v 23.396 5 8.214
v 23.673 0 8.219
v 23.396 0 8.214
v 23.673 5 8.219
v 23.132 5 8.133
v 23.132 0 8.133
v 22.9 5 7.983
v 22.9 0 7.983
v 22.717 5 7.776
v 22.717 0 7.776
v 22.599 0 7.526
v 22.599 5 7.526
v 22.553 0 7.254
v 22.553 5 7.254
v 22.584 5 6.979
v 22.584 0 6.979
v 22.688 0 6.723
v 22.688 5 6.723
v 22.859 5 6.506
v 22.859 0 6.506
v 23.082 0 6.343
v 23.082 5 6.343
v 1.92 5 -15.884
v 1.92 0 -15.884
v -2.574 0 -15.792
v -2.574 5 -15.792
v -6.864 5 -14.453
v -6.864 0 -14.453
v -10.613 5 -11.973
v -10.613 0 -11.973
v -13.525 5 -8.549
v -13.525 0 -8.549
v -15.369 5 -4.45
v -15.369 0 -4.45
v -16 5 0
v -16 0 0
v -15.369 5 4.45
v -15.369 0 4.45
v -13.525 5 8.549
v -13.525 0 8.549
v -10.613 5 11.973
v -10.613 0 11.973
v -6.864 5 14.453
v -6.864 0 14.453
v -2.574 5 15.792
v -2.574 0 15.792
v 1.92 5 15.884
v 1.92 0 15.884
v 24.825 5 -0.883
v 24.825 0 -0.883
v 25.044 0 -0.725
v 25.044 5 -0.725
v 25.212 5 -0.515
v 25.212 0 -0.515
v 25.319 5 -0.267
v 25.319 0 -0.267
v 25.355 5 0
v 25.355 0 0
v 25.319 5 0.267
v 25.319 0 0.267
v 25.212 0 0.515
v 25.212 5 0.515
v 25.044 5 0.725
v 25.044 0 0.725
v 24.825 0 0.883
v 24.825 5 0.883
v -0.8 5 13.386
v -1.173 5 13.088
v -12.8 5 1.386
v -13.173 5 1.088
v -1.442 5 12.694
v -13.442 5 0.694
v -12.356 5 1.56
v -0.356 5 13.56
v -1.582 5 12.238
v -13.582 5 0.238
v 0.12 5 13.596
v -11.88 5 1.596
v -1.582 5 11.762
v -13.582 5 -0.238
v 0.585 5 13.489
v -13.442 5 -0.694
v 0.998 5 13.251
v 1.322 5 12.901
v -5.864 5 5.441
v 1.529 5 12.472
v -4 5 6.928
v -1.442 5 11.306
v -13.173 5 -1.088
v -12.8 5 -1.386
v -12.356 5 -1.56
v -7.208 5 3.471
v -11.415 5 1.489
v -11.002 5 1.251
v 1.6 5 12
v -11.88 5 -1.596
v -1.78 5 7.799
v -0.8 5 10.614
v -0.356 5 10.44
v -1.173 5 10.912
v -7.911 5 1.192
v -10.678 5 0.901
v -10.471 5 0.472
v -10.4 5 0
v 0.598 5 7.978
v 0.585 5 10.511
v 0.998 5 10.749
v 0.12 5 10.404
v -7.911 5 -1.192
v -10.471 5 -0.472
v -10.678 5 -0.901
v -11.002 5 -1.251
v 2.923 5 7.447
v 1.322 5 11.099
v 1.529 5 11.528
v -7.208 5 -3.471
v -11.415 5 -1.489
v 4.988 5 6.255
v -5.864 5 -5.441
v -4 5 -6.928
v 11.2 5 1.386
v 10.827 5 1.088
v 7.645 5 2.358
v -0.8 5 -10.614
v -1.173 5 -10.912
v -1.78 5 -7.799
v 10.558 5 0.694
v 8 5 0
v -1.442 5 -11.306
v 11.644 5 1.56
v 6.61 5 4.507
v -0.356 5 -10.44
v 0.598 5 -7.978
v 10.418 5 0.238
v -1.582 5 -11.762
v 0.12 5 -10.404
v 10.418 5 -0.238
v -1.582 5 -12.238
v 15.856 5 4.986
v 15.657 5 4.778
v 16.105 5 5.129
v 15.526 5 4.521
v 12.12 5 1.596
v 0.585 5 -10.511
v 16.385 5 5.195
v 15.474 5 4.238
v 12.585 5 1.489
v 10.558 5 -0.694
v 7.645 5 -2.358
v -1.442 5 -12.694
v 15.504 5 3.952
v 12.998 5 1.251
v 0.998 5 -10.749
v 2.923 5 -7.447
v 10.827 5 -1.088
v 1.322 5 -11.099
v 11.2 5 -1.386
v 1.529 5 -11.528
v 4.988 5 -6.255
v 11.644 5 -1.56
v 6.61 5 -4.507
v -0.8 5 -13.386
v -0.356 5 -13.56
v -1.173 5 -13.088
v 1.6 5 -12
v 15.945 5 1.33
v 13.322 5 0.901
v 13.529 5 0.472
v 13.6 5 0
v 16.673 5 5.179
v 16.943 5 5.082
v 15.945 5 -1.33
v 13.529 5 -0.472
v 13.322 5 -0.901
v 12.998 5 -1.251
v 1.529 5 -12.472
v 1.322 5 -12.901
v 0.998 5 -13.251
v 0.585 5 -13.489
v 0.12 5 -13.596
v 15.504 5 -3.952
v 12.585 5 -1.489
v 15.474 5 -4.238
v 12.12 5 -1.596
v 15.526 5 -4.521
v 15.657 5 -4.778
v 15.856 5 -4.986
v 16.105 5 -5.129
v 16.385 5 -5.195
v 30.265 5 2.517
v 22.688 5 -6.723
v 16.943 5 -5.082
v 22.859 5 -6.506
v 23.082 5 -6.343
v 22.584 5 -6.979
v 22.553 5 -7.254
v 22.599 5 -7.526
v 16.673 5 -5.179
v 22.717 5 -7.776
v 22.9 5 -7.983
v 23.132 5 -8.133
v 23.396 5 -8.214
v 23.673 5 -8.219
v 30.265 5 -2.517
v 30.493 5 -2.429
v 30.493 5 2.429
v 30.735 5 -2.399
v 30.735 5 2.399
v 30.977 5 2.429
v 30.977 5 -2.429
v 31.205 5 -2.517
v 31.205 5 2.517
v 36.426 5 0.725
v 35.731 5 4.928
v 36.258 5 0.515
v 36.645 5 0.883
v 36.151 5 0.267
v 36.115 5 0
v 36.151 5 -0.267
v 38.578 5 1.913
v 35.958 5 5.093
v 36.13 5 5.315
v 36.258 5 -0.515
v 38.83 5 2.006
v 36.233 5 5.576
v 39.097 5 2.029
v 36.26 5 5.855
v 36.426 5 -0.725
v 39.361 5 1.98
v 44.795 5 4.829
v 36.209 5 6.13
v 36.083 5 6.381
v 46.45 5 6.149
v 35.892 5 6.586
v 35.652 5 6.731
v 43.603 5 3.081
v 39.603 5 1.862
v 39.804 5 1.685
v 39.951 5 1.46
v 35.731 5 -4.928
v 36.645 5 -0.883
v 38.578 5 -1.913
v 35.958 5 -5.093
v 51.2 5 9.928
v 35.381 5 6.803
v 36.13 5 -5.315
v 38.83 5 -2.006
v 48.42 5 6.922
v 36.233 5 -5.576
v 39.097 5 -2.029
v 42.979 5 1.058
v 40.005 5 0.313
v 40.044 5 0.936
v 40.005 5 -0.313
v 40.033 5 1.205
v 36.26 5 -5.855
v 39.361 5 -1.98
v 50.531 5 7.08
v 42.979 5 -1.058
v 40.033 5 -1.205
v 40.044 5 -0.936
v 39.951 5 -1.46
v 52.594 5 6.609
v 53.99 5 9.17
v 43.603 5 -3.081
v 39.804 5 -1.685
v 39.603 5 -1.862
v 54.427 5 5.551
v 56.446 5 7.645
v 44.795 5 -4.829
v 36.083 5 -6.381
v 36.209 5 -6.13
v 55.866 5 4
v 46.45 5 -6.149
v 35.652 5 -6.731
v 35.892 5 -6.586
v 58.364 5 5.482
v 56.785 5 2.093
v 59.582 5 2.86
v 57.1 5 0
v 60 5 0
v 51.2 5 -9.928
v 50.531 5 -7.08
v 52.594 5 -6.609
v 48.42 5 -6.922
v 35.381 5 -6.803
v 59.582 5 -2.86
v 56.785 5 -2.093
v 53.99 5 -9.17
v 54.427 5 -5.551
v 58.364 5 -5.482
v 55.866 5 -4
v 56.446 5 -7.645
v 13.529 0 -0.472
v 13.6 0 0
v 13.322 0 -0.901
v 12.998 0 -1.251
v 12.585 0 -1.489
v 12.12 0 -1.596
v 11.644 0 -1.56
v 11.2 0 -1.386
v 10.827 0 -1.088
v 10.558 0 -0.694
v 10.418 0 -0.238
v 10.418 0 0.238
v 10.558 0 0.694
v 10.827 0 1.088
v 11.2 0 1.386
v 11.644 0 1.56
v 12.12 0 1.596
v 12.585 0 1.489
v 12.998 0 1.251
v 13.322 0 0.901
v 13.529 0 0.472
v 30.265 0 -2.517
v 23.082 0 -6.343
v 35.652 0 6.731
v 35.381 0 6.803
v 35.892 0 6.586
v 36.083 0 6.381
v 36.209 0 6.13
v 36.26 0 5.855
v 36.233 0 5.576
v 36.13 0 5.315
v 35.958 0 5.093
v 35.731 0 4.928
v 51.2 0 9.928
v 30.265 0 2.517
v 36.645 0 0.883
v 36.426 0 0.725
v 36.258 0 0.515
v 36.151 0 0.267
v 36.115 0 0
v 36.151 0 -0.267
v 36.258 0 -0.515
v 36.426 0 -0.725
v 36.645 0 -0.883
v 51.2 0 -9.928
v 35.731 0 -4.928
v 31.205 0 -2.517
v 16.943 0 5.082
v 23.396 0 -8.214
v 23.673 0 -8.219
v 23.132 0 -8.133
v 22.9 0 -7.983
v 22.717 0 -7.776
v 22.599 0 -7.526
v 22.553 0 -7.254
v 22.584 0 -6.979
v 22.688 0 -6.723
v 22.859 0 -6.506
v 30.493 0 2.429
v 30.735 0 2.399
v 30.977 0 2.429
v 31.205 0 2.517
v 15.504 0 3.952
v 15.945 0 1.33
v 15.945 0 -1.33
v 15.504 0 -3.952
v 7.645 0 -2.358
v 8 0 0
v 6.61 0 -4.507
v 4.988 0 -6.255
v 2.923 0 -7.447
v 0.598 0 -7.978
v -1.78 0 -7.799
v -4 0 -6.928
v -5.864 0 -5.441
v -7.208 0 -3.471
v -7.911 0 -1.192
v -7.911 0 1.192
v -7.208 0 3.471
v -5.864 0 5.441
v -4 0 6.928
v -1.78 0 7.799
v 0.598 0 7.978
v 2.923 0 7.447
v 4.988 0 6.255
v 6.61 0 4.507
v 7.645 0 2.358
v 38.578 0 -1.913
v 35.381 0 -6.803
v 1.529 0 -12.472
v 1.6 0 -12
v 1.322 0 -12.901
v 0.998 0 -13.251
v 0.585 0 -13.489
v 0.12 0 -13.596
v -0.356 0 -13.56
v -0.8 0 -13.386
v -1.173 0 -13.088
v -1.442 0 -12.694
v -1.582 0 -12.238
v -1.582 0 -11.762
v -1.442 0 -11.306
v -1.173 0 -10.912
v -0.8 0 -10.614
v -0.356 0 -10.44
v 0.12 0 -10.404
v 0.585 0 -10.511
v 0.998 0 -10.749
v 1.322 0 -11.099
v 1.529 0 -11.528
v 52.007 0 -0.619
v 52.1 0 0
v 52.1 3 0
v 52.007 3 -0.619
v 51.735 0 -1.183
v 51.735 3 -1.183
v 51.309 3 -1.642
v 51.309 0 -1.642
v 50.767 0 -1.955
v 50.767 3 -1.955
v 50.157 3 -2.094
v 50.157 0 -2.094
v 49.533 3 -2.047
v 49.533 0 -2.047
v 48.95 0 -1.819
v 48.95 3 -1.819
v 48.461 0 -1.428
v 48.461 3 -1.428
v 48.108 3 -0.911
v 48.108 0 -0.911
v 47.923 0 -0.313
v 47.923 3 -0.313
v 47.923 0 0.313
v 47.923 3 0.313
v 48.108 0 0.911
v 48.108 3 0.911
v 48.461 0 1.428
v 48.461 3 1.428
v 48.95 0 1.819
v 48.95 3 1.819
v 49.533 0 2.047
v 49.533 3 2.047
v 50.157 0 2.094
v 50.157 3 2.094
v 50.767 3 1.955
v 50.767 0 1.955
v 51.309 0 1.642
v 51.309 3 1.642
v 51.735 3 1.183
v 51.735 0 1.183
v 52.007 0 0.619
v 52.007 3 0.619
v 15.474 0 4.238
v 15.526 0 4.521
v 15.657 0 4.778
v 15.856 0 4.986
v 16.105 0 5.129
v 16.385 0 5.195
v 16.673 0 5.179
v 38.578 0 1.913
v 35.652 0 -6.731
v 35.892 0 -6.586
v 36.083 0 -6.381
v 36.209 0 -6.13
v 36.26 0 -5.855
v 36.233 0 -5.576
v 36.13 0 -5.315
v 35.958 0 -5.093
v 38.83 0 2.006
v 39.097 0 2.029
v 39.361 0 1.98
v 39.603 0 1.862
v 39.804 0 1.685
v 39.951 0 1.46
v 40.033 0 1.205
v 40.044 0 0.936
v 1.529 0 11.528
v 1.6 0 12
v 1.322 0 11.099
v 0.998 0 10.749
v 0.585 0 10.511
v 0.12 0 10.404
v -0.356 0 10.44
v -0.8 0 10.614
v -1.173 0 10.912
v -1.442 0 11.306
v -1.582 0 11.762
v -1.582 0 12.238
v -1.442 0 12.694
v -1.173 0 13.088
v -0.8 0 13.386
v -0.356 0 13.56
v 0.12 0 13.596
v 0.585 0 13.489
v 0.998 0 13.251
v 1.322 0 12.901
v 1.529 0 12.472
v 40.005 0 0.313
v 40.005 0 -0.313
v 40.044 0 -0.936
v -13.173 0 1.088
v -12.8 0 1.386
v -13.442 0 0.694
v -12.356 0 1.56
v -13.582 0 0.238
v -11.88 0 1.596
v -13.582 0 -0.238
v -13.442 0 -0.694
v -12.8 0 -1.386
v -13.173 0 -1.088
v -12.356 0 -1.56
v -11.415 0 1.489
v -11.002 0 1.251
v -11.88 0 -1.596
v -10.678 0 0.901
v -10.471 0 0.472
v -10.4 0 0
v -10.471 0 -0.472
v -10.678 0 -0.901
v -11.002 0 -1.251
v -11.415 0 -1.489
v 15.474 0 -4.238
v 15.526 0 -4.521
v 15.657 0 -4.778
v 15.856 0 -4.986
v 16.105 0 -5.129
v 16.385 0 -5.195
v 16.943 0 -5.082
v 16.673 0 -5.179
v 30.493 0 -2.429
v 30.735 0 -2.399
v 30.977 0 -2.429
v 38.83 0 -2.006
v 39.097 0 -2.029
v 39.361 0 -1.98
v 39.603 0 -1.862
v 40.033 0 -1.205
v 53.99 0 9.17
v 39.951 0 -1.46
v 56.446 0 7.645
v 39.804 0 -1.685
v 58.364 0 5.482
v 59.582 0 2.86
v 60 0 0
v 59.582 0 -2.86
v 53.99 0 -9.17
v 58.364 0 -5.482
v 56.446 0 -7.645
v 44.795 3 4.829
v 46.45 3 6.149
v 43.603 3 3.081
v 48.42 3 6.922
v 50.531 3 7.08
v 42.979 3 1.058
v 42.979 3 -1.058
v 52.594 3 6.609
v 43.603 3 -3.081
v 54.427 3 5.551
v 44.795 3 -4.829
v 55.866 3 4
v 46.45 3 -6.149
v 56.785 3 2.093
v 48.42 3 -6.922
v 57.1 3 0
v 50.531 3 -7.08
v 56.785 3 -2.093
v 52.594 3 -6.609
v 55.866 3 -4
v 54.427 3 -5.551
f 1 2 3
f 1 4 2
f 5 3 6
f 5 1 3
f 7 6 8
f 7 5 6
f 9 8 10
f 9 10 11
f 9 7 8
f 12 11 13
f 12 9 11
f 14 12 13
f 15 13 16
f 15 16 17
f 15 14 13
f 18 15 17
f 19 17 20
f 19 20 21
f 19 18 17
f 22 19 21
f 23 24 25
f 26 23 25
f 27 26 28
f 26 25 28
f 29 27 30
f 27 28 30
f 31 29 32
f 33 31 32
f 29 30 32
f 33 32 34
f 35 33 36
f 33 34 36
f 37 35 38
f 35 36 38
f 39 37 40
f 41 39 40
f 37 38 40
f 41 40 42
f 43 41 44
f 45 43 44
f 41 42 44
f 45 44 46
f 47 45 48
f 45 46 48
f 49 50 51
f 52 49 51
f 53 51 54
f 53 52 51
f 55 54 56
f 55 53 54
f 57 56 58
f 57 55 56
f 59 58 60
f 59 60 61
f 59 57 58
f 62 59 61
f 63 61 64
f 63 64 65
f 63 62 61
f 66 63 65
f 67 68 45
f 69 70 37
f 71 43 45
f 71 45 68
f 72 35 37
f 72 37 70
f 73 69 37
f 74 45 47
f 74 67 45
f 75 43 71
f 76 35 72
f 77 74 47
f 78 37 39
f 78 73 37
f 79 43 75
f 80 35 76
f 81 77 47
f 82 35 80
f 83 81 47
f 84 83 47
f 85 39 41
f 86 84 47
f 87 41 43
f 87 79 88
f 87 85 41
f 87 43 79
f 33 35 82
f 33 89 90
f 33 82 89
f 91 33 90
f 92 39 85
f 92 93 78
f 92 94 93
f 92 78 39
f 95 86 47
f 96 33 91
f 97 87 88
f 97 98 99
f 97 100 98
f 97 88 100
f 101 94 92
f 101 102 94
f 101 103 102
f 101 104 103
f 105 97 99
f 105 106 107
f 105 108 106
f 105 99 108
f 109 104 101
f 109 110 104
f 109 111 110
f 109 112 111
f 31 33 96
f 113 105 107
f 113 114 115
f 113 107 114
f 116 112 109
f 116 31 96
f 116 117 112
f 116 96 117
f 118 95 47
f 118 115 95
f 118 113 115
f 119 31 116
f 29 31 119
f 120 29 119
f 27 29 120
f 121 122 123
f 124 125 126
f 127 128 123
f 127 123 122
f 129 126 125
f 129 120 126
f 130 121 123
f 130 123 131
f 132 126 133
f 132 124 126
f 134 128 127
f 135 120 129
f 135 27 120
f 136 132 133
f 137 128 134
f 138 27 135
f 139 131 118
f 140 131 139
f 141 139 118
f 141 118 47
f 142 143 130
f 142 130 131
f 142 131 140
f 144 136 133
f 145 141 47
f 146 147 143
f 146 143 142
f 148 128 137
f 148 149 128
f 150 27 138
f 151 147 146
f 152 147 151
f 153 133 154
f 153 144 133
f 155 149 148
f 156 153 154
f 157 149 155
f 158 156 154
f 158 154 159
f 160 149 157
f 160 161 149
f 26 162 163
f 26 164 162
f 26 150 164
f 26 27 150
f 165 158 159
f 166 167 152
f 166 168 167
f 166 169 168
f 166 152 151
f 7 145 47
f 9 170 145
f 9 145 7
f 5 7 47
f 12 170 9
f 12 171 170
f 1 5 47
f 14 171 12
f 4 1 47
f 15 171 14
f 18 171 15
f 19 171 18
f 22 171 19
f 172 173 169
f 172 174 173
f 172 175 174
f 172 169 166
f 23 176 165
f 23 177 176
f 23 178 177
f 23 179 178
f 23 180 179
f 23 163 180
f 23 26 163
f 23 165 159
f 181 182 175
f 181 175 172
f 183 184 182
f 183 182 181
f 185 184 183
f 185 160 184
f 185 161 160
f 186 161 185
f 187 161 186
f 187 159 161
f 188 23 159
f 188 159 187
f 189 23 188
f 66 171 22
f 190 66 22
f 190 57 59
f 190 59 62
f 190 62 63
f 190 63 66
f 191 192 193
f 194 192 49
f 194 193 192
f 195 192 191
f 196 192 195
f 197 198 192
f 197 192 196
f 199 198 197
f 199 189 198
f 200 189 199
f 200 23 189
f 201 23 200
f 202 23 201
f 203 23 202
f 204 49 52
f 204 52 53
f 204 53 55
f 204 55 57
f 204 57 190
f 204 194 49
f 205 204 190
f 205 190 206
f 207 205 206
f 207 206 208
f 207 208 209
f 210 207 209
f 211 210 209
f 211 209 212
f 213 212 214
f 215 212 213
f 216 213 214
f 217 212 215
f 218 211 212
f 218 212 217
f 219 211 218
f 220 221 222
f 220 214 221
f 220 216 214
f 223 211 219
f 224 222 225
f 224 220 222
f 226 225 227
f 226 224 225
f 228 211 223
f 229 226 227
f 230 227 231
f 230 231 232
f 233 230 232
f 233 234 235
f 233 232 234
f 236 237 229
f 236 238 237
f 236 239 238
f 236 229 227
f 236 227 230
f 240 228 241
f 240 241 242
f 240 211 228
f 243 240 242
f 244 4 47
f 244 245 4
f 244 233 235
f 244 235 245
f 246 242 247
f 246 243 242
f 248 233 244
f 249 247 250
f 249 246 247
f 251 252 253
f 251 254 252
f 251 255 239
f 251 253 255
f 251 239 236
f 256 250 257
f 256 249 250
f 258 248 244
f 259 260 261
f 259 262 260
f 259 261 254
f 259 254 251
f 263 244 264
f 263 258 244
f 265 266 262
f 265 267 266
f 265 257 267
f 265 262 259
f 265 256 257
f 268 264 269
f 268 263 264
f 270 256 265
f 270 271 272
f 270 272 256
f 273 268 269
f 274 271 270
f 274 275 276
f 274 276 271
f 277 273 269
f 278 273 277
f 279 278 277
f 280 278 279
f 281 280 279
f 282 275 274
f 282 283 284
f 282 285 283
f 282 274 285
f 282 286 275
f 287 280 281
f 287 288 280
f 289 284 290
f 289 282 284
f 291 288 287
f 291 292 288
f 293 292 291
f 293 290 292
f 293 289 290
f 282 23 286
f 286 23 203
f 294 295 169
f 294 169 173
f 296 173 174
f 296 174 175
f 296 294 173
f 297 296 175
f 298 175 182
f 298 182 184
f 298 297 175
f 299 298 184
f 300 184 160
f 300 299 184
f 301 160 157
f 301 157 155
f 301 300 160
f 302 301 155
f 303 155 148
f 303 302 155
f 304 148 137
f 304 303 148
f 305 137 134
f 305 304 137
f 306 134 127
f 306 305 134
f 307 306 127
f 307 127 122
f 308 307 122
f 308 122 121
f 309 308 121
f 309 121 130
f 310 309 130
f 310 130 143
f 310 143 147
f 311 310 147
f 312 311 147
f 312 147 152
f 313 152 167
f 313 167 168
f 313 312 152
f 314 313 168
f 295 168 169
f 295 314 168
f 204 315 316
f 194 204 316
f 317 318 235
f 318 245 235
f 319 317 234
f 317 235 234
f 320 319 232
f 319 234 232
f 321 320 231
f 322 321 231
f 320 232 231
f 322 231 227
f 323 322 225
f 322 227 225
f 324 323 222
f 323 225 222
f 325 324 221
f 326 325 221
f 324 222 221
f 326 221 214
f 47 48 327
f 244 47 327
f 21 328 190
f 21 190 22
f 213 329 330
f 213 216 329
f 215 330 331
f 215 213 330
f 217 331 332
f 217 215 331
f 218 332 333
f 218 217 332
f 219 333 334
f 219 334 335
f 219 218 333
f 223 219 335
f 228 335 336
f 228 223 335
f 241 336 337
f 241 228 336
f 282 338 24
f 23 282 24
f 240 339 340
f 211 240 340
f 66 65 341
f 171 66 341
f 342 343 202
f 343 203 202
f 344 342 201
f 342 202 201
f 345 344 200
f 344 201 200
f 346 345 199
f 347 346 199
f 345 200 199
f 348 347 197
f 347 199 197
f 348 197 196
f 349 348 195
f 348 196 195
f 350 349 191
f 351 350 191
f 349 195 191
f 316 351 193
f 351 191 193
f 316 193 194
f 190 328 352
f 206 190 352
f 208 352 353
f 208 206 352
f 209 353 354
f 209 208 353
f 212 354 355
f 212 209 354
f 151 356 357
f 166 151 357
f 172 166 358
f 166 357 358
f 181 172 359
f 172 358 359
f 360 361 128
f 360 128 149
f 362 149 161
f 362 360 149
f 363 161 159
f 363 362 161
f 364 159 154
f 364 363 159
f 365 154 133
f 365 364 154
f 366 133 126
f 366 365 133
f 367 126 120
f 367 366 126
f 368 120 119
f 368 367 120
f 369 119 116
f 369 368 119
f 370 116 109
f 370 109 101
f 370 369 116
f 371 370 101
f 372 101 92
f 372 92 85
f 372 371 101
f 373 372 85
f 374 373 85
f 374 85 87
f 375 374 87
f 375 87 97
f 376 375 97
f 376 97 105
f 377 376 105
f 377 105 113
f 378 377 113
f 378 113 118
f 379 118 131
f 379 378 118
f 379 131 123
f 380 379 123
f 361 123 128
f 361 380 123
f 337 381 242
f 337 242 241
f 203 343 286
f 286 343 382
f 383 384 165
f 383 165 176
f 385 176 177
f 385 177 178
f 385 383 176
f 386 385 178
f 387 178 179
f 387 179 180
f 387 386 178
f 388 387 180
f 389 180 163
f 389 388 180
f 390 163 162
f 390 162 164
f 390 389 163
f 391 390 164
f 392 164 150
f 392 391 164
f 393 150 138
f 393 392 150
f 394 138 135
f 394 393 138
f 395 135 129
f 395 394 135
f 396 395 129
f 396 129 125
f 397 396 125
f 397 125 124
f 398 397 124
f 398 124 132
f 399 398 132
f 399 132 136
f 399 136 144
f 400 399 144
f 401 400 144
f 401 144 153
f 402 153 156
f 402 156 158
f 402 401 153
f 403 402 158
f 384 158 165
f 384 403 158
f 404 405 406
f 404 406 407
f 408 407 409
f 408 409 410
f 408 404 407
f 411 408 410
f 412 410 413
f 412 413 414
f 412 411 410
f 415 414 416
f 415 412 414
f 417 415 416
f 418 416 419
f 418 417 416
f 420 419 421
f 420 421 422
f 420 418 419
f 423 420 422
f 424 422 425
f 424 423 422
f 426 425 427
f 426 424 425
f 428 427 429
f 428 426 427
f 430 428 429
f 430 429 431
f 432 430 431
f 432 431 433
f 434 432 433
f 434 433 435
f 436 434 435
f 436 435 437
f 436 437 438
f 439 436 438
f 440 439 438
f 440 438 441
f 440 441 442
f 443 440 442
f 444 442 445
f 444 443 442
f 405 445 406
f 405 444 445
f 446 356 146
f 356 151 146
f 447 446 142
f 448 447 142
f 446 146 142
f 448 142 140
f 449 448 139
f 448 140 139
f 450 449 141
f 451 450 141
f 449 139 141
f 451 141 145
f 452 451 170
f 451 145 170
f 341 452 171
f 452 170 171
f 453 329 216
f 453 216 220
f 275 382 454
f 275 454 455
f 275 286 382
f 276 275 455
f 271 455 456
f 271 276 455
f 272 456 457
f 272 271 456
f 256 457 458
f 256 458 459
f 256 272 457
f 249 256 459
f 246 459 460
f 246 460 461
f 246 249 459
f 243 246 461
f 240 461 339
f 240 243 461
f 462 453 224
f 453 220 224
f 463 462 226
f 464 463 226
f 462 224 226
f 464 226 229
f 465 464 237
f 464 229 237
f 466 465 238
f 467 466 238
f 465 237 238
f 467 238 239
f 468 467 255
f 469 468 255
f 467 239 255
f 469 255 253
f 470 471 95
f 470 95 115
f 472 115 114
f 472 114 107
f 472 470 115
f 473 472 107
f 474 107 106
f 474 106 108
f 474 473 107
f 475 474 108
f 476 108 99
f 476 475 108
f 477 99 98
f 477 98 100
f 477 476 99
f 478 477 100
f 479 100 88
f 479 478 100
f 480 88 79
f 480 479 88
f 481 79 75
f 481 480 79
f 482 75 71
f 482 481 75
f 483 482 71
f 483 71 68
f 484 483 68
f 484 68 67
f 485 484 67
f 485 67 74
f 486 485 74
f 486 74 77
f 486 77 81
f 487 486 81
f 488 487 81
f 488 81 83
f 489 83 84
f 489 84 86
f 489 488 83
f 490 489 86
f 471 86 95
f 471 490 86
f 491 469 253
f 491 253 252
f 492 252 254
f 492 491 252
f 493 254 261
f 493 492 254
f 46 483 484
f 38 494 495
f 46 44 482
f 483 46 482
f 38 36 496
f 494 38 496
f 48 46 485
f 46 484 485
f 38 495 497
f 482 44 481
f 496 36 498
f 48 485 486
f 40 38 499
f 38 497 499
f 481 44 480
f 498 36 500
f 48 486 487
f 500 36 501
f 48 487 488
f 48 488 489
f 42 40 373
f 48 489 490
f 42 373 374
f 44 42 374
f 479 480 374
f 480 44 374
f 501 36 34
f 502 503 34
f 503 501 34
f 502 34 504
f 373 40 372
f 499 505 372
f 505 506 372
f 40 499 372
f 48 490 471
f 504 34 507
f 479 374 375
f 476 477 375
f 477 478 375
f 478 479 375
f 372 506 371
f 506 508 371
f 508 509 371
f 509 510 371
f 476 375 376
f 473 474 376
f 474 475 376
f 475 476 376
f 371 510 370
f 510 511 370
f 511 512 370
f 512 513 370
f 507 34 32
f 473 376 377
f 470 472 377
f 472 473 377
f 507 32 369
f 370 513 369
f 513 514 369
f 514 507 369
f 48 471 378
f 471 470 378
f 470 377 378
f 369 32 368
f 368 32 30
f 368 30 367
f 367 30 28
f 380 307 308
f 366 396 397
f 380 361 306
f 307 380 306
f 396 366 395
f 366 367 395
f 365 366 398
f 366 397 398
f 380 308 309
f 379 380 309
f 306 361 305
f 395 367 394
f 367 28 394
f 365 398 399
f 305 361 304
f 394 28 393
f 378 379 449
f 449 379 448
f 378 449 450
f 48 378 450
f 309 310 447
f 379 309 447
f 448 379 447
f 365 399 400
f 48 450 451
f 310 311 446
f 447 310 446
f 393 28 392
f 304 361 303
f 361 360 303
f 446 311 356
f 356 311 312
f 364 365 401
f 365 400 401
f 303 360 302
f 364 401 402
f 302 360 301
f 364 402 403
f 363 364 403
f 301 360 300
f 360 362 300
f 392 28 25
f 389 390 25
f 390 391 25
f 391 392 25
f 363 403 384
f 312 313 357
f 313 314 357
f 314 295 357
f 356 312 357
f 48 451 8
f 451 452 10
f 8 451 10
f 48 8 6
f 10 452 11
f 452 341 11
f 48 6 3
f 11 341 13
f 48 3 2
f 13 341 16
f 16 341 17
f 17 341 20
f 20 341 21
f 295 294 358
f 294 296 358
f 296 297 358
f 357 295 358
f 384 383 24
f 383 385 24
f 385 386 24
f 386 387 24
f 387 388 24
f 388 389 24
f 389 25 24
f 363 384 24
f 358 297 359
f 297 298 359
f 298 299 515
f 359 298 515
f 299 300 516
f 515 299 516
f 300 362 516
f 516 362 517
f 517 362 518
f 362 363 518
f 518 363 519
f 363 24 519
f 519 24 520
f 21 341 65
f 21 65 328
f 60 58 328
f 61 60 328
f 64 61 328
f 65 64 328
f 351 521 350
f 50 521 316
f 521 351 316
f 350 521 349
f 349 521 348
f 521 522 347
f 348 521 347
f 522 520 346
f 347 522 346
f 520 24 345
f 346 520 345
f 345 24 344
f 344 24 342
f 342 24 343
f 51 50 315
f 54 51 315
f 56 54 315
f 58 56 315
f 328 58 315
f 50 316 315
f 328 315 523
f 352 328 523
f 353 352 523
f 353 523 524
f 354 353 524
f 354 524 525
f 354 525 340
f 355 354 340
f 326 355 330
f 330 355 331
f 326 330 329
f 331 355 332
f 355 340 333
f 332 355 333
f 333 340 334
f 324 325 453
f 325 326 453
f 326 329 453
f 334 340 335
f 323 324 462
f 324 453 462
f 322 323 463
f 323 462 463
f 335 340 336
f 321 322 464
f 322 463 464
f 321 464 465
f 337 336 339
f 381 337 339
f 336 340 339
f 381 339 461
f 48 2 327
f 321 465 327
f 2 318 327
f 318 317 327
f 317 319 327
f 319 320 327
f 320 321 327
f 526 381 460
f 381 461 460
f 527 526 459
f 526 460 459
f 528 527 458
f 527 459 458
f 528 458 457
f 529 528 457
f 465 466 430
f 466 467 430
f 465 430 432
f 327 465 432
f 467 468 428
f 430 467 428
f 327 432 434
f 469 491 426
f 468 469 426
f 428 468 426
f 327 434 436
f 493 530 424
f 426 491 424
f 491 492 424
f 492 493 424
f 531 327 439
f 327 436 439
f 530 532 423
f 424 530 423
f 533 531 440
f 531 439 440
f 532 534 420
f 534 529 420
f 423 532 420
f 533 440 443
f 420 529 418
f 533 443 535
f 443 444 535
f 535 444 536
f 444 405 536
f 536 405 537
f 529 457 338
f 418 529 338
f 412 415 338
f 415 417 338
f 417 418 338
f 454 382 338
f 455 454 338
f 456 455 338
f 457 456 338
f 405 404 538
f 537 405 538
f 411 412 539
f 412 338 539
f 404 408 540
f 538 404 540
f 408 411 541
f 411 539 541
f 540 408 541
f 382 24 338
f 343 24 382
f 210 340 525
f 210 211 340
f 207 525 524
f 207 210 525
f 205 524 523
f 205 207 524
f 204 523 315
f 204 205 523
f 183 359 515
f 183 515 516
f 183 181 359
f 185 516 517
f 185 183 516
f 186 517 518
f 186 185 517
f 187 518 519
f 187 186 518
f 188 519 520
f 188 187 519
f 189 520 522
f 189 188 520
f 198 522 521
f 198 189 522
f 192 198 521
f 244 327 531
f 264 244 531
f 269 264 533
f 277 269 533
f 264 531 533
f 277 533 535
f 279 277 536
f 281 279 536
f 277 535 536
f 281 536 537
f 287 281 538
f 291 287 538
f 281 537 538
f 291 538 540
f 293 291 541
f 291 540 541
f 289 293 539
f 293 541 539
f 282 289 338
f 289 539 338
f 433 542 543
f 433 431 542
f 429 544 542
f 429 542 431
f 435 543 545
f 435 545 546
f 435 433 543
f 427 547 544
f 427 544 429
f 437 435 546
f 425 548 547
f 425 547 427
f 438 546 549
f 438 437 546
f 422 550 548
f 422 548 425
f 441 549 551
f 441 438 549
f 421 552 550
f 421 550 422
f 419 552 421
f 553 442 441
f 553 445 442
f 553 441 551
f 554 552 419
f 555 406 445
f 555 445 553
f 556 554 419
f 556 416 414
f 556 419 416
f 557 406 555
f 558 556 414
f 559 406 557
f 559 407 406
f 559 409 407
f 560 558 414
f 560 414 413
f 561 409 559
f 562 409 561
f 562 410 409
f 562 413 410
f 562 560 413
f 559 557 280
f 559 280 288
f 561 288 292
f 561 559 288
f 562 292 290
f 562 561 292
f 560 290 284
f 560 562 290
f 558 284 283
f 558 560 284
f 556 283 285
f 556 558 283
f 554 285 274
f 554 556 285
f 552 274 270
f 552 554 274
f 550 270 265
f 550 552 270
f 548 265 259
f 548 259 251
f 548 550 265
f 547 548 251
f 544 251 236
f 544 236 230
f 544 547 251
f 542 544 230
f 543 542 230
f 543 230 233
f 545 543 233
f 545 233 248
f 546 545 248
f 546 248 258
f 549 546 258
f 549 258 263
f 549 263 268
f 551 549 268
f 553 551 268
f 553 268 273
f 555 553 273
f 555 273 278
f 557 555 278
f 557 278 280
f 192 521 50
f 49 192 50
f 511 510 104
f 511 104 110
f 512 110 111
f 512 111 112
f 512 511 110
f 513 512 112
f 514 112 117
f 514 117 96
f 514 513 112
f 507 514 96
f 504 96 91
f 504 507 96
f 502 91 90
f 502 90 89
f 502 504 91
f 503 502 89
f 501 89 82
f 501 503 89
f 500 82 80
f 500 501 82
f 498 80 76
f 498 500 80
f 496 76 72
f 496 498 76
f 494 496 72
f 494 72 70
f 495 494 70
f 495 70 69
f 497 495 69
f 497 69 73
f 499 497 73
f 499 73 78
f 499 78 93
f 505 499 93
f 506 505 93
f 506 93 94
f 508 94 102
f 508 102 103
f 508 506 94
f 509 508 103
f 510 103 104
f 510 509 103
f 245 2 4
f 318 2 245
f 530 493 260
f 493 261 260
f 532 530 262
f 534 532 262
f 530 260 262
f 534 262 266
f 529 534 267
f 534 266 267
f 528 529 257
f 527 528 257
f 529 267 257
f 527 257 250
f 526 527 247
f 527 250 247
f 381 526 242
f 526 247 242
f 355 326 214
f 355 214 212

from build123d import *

# Parameters (mm, degrees)
SKETCH_1_R      = 1.6
SKETCH_1_R_2    = 8
SKETCH_1_R_3    = 7.1
EXTRUDE_1_DEPTH = 5
SKETCH_1_3_R    = 7.1
SKETCH_1_3_R_2  = 2.1
EXTRUDE_2_DEPTH = 3
FILLET_1_R      = 1
FILLET_2_R      = 1
FILLET_3_R      = 1
FILLET_4_R      = 1


with BuildPart() as part:
    # 草图1 → 凸台-拉伸1 (new body)
    with BuildSketch(Plane(origin=(0, 0, 0), x_dir=(1, 0, 0), z_dir=(0, 1, 0))):
        with BuildLine():
            ThreePointArc((1.92, 15.884382267), (-16, 0), (1.92, -15.884382267))
            Line((1.92, -15.884382267), (51.2, -9.927738917))
            ThreePointArc((51.2, -9.927738917), (60, 0), (51.2, 9.927738917))
            Line((51.2, 9.927738917), (1.92, 15.884382267))
        make_face()
        with Locations((0, -12)):
            Circle(SKETCH_1_R, mode=Mode.SUBTRACT)
        with Locations((-12, 0)):
            Circle(SKETCH_1_R, mode=Mode.SUBTRACT)
        Circle(SKETCH_1_R_2, mode=Mode.SUBTRACT)
        with Locations((12, 0)):
            Circle(SKETCH_1_R, mode=Mode.SUBTRACT)
        Polygon((38.535462938, -6.422151611), (18.356508588, -8.861251331), (30.734984007, -2.266153232), align=None, mode=Mode.SUBTRACT)
        with BuildLine():
            Line((40.429404433, -2.898913674), (34.988373668, 0))
            Line((34.988373668, 0), (40.429404433, 2.898913674))
            ThreePointArc((40.429404433, 2.898913674), (40, 0), (40.429404433, -2.898913674))
        make_face(mode=Mode.SUBTRACT)
        with Locations((50, 0)):
            Circle(SKETCH_1_R_3, mode=Mode.SUBTRACT)
        with BuildLine():
            ThreePointArc((14.72234722, -6.265180949), (16, 0), (14.72234722, 6.265180949))
            Line((14.72234722, 6.265180949), (26.481594346, 0))
            Line((26.481594346, 0), (14.72234722, -6.265180949))
        make_face(mode=Mode.SUBTRACT)
        with Locations((0, 12)):
            Circle(SKETCH_1_R, mode=Mode.SUBTRACT)
        Polygon((30.734984007, 2.266153232), (18.356508588, 8.861251331), (38.535462938, 6.422151611), align=None, mode=Mode.SUBTRACT)
    extrude(amount=EXTRUDE_1_DEPTH)

    # 草图1<3> → 凸台-拉伸2 (add)
    with BuildSketch(Plane(origin=(0, 0, 0), x_dir=(1, 0, 0), z_dir=(0, 1, 0))):
        with Locations((50, 0)):
            Circle(SKETCH_1_3_R)
        with Locations((50, 0)):
            Circle(SKETCH_1_3_R_2, mode=Mode.SUBTRACT)
    extrude(amount=EXTRUDE_2_DEPTH)

    # 圆角1
    fillet_1_edges = [part.edges().sort_by_distance(p)[0] for p in [
        (34.988373668, 2.5, 0),
        (40.429404433, 2.5, -2.898913674),
        (40.429404433, 2.5, 2.898913674),
    ]]
    fillet(fillet_1_edges, radius=FILLET_1_R)

    # 圆角2
    fillet_2_edges = [part.edges().sort_by_distance(p)[0] for p in [
        (30.734984007, 2.5, 2.266153232),
        (18.356508588, 2.5, 8.861251331),
        (38.535462938, 2.5, 6.422151611),
    ]]
    fillet(fillet_2_edges, radius=FILLET_2_R)

    # 圆角3
    fillet_3_edges = [part.edges().sort_by_distance(p)[0] for p in [
        (18.356508588, 2.5, -8.861251331),
        (30.734984007, 2.5, -2.266153232),
        (38.535462938, 2.5, -6.422151611),
    ]]
    fillet(fillet_3_edges, radius=FILLET_3_R)

    # 圆角4
    fillet_4_edges = [part.edges().sort_by_distance(p)[0] for p in [
        (14.72234722, 2.5, -6.265180949),
        (26.481594346, 2.5, 0),
        (14.72234722, 2.5, 6.265180949),
    ]]
    fillet(fillet_4_edges, radius=FILLET_4_R)


solid = part.part
